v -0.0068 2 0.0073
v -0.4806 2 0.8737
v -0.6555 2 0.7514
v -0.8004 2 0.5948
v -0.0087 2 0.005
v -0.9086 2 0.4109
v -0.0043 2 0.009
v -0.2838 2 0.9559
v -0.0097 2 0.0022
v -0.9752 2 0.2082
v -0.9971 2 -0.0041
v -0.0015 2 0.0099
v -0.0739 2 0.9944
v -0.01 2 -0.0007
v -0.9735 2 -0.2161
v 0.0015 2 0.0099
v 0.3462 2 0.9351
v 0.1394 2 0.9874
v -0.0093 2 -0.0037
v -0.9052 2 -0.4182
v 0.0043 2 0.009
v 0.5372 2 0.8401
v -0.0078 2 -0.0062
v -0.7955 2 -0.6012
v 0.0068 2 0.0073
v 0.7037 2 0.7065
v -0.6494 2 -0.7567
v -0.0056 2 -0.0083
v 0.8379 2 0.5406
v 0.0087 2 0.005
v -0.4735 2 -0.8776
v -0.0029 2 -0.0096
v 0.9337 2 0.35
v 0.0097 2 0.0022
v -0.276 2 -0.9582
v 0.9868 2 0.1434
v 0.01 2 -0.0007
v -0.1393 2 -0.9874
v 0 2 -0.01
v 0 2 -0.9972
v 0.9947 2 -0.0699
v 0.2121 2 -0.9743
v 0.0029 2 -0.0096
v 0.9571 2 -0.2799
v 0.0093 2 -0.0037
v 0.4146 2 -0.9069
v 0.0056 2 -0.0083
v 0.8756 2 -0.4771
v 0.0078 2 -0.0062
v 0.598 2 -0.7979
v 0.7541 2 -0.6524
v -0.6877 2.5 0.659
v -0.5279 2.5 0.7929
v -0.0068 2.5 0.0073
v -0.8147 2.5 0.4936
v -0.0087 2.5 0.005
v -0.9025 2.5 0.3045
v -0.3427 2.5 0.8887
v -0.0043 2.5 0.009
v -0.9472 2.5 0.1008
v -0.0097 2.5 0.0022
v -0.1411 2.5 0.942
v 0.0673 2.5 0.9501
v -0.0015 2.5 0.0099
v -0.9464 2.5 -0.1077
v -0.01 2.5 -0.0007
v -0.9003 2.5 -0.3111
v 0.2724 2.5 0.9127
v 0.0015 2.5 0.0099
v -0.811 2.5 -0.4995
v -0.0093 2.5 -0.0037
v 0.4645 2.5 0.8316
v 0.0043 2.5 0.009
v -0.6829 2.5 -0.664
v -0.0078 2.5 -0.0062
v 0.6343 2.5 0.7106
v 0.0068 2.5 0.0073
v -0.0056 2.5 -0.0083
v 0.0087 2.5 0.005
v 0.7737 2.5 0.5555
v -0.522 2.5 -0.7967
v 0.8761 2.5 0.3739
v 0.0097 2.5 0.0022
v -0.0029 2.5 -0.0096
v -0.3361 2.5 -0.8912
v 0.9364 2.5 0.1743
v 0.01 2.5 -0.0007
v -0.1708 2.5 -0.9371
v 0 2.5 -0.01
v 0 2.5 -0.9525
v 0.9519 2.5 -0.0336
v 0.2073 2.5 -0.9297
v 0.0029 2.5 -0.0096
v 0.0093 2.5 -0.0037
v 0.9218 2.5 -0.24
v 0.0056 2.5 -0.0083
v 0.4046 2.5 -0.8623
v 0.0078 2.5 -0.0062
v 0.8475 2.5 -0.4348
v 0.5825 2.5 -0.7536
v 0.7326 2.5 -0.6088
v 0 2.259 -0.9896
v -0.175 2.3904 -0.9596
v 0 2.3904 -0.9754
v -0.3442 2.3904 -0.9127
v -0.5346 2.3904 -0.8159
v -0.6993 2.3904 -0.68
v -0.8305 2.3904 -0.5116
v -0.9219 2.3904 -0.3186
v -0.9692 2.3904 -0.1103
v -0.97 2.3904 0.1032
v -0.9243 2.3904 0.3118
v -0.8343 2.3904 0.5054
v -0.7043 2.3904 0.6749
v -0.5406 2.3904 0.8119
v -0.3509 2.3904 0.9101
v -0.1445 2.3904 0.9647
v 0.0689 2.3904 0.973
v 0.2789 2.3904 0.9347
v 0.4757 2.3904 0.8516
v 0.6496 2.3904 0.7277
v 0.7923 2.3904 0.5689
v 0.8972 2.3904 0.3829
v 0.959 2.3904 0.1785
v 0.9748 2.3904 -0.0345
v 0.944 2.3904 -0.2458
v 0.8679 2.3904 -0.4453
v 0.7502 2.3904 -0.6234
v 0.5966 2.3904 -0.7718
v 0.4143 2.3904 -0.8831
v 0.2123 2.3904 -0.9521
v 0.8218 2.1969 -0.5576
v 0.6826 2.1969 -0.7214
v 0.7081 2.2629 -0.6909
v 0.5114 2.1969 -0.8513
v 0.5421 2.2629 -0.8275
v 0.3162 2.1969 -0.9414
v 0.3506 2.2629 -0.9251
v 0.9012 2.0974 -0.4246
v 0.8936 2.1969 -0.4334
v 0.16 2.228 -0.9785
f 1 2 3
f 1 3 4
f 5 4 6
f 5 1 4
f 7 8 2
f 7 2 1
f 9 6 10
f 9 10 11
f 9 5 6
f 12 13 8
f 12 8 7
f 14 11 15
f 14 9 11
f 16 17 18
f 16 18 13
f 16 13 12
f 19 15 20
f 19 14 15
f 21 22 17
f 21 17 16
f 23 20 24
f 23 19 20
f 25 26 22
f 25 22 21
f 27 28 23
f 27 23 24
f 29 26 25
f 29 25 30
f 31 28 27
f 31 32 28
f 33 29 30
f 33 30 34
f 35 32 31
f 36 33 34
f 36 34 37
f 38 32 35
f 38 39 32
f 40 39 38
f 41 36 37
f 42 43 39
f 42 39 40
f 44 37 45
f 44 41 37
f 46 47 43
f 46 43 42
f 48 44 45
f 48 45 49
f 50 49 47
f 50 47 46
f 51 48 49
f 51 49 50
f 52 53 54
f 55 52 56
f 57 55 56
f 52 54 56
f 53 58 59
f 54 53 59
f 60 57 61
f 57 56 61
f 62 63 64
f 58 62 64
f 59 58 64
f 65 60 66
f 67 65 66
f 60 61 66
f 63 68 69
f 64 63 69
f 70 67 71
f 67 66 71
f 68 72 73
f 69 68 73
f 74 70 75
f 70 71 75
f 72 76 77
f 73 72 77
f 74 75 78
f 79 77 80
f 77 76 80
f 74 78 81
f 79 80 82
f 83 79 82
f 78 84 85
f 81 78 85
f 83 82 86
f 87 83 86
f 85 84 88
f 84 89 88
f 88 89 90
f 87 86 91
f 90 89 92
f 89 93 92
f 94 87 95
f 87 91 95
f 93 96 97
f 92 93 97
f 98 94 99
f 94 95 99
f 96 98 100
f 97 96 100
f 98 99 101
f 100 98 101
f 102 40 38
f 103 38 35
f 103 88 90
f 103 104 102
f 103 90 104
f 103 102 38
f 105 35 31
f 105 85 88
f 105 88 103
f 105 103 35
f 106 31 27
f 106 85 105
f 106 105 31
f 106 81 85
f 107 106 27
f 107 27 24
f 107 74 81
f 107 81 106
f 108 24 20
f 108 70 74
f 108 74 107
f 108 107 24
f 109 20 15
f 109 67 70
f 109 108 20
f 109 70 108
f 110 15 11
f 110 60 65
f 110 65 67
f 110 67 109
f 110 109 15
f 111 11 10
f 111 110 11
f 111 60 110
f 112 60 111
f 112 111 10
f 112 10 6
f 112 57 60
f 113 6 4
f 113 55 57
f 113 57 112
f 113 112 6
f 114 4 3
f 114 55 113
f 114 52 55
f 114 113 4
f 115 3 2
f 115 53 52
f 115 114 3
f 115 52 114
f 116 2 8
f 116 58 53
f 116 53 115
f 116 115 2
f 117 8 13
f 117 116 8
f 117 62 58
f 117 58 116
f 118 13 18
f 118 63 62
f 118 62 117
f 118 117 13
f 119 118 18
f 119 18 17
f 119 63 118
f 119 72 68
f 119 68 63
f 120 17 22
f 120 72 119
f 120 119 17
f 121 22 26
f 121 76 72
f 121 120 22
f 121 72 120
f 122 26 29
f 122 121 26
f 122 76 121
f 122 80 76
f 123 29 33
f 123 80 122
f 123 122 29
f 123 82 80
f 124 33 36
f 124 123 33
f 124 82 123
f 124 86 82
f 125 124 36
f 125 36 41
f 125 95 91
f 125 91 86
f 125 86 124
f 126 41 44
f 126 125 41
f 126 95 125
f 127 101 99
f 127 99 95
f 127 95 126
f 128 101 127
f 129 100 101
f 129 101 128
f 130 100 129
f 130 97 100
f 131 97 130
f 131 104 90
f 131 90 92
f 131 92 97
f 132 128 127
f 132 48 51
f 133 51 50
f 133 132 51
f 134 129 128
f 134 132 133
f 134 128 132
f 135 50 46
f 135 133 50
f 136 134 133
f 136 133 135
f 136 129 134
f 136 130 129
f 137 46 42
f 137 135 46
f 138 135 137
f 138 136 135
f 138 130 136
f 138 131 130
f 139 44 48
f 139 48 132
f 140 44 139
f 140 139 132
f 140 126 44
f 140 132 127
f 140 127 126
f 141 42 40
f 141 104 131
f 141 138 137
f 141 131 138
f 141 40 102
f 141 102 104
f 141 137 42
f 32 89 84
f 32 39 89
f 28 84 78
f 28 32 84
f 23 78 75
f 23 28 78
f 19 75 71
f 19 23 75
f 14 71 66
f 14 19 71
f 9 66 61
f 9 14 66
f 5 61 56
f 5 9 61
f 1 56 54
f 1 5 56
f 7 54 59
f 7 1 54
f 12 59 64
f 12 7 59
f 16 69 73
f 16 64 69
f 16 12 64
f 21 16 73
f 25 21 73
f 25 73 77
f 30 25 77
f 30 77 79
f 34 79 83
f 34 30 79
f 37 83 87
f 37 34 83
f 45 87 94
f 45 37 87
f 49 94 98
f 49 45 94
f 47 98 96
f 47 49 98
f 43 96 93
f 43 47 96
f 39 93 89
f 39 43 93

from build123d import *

# Parameters (mm, degrees)
SKETCH043_W   = 5.272505
SKETCH043_H   = 4.54278
SKETCH043_W_2 = 8.635091
SKETCH043_H_2 = 4.530322


with BuildPart() as part:
    # Sketch042 → Revolution008 (revolve)
    with BuildSketch(Plane(origin=(0, 0, -0.01), x_dir=(0, -1, 0), z_dir=(1, 0, 0))):
        with BuildLine():
            add(Edge.make_bspline(
                [(-0.769069, 0.754505), (-0.951665, 0.760534), (-1.141624, 0.77961), (-1.207908, 0.98313), (-1.364894, 0.994421), (-1.864947, 0.98477), (-2.775705, 0.990587), (-2.785126, 0.387148), (-2.848858, 0.260184), (-2.896467, 0.235343), (-2.966179, 0.25)],
                knots=[0, 0, 0, 0, 0.125, 0.25, 0.375, 0.5, 0.625, 0.75, 0.875, 1, 1, 1, 1], degree=3))
            Line((-2.966179, 0.25), (-2.966179, 0))
            Line((-2.966179, 0), (0, 0))
            Line((0, 0), (0, 0.75))
            add(Edge.make_bspline(
                [(-0.769069, 0.754505), (-0.446942, 0.755366), (0, 0.75)],
                knots=[0, 0, 0, 1, 1, 1], degree=2))
        make_face()
    revolution008 = revolve(axis=Axis((0, 0, 0), (0, 1, 0)))

    # Mirrored012: Revolution008 across Sketch042 V_Axis
    add(revolution008.mirror(Plane(origin=(0, 0, -0.01), x_dir=(1, 0, 0), z_dir=(0, -1, 0))))

    # Sketch043 → Groove004 (revolve, cut)
    with BuildSketch(Plane.YZ):
        with Locations((5.136252, 2.27139)):
            Rectangle(SKETCH043_W, SKETCH043_H)
        with Locations((-2.317546, 2.265161)):
            Rectangle(SKETCH043_W_2, SKETCH043_H_2)
    revolve(axis=Axis((0, 0, 0), (0, 1, 0)), mode=Mode.SUBTRACT)


solid = part.part
